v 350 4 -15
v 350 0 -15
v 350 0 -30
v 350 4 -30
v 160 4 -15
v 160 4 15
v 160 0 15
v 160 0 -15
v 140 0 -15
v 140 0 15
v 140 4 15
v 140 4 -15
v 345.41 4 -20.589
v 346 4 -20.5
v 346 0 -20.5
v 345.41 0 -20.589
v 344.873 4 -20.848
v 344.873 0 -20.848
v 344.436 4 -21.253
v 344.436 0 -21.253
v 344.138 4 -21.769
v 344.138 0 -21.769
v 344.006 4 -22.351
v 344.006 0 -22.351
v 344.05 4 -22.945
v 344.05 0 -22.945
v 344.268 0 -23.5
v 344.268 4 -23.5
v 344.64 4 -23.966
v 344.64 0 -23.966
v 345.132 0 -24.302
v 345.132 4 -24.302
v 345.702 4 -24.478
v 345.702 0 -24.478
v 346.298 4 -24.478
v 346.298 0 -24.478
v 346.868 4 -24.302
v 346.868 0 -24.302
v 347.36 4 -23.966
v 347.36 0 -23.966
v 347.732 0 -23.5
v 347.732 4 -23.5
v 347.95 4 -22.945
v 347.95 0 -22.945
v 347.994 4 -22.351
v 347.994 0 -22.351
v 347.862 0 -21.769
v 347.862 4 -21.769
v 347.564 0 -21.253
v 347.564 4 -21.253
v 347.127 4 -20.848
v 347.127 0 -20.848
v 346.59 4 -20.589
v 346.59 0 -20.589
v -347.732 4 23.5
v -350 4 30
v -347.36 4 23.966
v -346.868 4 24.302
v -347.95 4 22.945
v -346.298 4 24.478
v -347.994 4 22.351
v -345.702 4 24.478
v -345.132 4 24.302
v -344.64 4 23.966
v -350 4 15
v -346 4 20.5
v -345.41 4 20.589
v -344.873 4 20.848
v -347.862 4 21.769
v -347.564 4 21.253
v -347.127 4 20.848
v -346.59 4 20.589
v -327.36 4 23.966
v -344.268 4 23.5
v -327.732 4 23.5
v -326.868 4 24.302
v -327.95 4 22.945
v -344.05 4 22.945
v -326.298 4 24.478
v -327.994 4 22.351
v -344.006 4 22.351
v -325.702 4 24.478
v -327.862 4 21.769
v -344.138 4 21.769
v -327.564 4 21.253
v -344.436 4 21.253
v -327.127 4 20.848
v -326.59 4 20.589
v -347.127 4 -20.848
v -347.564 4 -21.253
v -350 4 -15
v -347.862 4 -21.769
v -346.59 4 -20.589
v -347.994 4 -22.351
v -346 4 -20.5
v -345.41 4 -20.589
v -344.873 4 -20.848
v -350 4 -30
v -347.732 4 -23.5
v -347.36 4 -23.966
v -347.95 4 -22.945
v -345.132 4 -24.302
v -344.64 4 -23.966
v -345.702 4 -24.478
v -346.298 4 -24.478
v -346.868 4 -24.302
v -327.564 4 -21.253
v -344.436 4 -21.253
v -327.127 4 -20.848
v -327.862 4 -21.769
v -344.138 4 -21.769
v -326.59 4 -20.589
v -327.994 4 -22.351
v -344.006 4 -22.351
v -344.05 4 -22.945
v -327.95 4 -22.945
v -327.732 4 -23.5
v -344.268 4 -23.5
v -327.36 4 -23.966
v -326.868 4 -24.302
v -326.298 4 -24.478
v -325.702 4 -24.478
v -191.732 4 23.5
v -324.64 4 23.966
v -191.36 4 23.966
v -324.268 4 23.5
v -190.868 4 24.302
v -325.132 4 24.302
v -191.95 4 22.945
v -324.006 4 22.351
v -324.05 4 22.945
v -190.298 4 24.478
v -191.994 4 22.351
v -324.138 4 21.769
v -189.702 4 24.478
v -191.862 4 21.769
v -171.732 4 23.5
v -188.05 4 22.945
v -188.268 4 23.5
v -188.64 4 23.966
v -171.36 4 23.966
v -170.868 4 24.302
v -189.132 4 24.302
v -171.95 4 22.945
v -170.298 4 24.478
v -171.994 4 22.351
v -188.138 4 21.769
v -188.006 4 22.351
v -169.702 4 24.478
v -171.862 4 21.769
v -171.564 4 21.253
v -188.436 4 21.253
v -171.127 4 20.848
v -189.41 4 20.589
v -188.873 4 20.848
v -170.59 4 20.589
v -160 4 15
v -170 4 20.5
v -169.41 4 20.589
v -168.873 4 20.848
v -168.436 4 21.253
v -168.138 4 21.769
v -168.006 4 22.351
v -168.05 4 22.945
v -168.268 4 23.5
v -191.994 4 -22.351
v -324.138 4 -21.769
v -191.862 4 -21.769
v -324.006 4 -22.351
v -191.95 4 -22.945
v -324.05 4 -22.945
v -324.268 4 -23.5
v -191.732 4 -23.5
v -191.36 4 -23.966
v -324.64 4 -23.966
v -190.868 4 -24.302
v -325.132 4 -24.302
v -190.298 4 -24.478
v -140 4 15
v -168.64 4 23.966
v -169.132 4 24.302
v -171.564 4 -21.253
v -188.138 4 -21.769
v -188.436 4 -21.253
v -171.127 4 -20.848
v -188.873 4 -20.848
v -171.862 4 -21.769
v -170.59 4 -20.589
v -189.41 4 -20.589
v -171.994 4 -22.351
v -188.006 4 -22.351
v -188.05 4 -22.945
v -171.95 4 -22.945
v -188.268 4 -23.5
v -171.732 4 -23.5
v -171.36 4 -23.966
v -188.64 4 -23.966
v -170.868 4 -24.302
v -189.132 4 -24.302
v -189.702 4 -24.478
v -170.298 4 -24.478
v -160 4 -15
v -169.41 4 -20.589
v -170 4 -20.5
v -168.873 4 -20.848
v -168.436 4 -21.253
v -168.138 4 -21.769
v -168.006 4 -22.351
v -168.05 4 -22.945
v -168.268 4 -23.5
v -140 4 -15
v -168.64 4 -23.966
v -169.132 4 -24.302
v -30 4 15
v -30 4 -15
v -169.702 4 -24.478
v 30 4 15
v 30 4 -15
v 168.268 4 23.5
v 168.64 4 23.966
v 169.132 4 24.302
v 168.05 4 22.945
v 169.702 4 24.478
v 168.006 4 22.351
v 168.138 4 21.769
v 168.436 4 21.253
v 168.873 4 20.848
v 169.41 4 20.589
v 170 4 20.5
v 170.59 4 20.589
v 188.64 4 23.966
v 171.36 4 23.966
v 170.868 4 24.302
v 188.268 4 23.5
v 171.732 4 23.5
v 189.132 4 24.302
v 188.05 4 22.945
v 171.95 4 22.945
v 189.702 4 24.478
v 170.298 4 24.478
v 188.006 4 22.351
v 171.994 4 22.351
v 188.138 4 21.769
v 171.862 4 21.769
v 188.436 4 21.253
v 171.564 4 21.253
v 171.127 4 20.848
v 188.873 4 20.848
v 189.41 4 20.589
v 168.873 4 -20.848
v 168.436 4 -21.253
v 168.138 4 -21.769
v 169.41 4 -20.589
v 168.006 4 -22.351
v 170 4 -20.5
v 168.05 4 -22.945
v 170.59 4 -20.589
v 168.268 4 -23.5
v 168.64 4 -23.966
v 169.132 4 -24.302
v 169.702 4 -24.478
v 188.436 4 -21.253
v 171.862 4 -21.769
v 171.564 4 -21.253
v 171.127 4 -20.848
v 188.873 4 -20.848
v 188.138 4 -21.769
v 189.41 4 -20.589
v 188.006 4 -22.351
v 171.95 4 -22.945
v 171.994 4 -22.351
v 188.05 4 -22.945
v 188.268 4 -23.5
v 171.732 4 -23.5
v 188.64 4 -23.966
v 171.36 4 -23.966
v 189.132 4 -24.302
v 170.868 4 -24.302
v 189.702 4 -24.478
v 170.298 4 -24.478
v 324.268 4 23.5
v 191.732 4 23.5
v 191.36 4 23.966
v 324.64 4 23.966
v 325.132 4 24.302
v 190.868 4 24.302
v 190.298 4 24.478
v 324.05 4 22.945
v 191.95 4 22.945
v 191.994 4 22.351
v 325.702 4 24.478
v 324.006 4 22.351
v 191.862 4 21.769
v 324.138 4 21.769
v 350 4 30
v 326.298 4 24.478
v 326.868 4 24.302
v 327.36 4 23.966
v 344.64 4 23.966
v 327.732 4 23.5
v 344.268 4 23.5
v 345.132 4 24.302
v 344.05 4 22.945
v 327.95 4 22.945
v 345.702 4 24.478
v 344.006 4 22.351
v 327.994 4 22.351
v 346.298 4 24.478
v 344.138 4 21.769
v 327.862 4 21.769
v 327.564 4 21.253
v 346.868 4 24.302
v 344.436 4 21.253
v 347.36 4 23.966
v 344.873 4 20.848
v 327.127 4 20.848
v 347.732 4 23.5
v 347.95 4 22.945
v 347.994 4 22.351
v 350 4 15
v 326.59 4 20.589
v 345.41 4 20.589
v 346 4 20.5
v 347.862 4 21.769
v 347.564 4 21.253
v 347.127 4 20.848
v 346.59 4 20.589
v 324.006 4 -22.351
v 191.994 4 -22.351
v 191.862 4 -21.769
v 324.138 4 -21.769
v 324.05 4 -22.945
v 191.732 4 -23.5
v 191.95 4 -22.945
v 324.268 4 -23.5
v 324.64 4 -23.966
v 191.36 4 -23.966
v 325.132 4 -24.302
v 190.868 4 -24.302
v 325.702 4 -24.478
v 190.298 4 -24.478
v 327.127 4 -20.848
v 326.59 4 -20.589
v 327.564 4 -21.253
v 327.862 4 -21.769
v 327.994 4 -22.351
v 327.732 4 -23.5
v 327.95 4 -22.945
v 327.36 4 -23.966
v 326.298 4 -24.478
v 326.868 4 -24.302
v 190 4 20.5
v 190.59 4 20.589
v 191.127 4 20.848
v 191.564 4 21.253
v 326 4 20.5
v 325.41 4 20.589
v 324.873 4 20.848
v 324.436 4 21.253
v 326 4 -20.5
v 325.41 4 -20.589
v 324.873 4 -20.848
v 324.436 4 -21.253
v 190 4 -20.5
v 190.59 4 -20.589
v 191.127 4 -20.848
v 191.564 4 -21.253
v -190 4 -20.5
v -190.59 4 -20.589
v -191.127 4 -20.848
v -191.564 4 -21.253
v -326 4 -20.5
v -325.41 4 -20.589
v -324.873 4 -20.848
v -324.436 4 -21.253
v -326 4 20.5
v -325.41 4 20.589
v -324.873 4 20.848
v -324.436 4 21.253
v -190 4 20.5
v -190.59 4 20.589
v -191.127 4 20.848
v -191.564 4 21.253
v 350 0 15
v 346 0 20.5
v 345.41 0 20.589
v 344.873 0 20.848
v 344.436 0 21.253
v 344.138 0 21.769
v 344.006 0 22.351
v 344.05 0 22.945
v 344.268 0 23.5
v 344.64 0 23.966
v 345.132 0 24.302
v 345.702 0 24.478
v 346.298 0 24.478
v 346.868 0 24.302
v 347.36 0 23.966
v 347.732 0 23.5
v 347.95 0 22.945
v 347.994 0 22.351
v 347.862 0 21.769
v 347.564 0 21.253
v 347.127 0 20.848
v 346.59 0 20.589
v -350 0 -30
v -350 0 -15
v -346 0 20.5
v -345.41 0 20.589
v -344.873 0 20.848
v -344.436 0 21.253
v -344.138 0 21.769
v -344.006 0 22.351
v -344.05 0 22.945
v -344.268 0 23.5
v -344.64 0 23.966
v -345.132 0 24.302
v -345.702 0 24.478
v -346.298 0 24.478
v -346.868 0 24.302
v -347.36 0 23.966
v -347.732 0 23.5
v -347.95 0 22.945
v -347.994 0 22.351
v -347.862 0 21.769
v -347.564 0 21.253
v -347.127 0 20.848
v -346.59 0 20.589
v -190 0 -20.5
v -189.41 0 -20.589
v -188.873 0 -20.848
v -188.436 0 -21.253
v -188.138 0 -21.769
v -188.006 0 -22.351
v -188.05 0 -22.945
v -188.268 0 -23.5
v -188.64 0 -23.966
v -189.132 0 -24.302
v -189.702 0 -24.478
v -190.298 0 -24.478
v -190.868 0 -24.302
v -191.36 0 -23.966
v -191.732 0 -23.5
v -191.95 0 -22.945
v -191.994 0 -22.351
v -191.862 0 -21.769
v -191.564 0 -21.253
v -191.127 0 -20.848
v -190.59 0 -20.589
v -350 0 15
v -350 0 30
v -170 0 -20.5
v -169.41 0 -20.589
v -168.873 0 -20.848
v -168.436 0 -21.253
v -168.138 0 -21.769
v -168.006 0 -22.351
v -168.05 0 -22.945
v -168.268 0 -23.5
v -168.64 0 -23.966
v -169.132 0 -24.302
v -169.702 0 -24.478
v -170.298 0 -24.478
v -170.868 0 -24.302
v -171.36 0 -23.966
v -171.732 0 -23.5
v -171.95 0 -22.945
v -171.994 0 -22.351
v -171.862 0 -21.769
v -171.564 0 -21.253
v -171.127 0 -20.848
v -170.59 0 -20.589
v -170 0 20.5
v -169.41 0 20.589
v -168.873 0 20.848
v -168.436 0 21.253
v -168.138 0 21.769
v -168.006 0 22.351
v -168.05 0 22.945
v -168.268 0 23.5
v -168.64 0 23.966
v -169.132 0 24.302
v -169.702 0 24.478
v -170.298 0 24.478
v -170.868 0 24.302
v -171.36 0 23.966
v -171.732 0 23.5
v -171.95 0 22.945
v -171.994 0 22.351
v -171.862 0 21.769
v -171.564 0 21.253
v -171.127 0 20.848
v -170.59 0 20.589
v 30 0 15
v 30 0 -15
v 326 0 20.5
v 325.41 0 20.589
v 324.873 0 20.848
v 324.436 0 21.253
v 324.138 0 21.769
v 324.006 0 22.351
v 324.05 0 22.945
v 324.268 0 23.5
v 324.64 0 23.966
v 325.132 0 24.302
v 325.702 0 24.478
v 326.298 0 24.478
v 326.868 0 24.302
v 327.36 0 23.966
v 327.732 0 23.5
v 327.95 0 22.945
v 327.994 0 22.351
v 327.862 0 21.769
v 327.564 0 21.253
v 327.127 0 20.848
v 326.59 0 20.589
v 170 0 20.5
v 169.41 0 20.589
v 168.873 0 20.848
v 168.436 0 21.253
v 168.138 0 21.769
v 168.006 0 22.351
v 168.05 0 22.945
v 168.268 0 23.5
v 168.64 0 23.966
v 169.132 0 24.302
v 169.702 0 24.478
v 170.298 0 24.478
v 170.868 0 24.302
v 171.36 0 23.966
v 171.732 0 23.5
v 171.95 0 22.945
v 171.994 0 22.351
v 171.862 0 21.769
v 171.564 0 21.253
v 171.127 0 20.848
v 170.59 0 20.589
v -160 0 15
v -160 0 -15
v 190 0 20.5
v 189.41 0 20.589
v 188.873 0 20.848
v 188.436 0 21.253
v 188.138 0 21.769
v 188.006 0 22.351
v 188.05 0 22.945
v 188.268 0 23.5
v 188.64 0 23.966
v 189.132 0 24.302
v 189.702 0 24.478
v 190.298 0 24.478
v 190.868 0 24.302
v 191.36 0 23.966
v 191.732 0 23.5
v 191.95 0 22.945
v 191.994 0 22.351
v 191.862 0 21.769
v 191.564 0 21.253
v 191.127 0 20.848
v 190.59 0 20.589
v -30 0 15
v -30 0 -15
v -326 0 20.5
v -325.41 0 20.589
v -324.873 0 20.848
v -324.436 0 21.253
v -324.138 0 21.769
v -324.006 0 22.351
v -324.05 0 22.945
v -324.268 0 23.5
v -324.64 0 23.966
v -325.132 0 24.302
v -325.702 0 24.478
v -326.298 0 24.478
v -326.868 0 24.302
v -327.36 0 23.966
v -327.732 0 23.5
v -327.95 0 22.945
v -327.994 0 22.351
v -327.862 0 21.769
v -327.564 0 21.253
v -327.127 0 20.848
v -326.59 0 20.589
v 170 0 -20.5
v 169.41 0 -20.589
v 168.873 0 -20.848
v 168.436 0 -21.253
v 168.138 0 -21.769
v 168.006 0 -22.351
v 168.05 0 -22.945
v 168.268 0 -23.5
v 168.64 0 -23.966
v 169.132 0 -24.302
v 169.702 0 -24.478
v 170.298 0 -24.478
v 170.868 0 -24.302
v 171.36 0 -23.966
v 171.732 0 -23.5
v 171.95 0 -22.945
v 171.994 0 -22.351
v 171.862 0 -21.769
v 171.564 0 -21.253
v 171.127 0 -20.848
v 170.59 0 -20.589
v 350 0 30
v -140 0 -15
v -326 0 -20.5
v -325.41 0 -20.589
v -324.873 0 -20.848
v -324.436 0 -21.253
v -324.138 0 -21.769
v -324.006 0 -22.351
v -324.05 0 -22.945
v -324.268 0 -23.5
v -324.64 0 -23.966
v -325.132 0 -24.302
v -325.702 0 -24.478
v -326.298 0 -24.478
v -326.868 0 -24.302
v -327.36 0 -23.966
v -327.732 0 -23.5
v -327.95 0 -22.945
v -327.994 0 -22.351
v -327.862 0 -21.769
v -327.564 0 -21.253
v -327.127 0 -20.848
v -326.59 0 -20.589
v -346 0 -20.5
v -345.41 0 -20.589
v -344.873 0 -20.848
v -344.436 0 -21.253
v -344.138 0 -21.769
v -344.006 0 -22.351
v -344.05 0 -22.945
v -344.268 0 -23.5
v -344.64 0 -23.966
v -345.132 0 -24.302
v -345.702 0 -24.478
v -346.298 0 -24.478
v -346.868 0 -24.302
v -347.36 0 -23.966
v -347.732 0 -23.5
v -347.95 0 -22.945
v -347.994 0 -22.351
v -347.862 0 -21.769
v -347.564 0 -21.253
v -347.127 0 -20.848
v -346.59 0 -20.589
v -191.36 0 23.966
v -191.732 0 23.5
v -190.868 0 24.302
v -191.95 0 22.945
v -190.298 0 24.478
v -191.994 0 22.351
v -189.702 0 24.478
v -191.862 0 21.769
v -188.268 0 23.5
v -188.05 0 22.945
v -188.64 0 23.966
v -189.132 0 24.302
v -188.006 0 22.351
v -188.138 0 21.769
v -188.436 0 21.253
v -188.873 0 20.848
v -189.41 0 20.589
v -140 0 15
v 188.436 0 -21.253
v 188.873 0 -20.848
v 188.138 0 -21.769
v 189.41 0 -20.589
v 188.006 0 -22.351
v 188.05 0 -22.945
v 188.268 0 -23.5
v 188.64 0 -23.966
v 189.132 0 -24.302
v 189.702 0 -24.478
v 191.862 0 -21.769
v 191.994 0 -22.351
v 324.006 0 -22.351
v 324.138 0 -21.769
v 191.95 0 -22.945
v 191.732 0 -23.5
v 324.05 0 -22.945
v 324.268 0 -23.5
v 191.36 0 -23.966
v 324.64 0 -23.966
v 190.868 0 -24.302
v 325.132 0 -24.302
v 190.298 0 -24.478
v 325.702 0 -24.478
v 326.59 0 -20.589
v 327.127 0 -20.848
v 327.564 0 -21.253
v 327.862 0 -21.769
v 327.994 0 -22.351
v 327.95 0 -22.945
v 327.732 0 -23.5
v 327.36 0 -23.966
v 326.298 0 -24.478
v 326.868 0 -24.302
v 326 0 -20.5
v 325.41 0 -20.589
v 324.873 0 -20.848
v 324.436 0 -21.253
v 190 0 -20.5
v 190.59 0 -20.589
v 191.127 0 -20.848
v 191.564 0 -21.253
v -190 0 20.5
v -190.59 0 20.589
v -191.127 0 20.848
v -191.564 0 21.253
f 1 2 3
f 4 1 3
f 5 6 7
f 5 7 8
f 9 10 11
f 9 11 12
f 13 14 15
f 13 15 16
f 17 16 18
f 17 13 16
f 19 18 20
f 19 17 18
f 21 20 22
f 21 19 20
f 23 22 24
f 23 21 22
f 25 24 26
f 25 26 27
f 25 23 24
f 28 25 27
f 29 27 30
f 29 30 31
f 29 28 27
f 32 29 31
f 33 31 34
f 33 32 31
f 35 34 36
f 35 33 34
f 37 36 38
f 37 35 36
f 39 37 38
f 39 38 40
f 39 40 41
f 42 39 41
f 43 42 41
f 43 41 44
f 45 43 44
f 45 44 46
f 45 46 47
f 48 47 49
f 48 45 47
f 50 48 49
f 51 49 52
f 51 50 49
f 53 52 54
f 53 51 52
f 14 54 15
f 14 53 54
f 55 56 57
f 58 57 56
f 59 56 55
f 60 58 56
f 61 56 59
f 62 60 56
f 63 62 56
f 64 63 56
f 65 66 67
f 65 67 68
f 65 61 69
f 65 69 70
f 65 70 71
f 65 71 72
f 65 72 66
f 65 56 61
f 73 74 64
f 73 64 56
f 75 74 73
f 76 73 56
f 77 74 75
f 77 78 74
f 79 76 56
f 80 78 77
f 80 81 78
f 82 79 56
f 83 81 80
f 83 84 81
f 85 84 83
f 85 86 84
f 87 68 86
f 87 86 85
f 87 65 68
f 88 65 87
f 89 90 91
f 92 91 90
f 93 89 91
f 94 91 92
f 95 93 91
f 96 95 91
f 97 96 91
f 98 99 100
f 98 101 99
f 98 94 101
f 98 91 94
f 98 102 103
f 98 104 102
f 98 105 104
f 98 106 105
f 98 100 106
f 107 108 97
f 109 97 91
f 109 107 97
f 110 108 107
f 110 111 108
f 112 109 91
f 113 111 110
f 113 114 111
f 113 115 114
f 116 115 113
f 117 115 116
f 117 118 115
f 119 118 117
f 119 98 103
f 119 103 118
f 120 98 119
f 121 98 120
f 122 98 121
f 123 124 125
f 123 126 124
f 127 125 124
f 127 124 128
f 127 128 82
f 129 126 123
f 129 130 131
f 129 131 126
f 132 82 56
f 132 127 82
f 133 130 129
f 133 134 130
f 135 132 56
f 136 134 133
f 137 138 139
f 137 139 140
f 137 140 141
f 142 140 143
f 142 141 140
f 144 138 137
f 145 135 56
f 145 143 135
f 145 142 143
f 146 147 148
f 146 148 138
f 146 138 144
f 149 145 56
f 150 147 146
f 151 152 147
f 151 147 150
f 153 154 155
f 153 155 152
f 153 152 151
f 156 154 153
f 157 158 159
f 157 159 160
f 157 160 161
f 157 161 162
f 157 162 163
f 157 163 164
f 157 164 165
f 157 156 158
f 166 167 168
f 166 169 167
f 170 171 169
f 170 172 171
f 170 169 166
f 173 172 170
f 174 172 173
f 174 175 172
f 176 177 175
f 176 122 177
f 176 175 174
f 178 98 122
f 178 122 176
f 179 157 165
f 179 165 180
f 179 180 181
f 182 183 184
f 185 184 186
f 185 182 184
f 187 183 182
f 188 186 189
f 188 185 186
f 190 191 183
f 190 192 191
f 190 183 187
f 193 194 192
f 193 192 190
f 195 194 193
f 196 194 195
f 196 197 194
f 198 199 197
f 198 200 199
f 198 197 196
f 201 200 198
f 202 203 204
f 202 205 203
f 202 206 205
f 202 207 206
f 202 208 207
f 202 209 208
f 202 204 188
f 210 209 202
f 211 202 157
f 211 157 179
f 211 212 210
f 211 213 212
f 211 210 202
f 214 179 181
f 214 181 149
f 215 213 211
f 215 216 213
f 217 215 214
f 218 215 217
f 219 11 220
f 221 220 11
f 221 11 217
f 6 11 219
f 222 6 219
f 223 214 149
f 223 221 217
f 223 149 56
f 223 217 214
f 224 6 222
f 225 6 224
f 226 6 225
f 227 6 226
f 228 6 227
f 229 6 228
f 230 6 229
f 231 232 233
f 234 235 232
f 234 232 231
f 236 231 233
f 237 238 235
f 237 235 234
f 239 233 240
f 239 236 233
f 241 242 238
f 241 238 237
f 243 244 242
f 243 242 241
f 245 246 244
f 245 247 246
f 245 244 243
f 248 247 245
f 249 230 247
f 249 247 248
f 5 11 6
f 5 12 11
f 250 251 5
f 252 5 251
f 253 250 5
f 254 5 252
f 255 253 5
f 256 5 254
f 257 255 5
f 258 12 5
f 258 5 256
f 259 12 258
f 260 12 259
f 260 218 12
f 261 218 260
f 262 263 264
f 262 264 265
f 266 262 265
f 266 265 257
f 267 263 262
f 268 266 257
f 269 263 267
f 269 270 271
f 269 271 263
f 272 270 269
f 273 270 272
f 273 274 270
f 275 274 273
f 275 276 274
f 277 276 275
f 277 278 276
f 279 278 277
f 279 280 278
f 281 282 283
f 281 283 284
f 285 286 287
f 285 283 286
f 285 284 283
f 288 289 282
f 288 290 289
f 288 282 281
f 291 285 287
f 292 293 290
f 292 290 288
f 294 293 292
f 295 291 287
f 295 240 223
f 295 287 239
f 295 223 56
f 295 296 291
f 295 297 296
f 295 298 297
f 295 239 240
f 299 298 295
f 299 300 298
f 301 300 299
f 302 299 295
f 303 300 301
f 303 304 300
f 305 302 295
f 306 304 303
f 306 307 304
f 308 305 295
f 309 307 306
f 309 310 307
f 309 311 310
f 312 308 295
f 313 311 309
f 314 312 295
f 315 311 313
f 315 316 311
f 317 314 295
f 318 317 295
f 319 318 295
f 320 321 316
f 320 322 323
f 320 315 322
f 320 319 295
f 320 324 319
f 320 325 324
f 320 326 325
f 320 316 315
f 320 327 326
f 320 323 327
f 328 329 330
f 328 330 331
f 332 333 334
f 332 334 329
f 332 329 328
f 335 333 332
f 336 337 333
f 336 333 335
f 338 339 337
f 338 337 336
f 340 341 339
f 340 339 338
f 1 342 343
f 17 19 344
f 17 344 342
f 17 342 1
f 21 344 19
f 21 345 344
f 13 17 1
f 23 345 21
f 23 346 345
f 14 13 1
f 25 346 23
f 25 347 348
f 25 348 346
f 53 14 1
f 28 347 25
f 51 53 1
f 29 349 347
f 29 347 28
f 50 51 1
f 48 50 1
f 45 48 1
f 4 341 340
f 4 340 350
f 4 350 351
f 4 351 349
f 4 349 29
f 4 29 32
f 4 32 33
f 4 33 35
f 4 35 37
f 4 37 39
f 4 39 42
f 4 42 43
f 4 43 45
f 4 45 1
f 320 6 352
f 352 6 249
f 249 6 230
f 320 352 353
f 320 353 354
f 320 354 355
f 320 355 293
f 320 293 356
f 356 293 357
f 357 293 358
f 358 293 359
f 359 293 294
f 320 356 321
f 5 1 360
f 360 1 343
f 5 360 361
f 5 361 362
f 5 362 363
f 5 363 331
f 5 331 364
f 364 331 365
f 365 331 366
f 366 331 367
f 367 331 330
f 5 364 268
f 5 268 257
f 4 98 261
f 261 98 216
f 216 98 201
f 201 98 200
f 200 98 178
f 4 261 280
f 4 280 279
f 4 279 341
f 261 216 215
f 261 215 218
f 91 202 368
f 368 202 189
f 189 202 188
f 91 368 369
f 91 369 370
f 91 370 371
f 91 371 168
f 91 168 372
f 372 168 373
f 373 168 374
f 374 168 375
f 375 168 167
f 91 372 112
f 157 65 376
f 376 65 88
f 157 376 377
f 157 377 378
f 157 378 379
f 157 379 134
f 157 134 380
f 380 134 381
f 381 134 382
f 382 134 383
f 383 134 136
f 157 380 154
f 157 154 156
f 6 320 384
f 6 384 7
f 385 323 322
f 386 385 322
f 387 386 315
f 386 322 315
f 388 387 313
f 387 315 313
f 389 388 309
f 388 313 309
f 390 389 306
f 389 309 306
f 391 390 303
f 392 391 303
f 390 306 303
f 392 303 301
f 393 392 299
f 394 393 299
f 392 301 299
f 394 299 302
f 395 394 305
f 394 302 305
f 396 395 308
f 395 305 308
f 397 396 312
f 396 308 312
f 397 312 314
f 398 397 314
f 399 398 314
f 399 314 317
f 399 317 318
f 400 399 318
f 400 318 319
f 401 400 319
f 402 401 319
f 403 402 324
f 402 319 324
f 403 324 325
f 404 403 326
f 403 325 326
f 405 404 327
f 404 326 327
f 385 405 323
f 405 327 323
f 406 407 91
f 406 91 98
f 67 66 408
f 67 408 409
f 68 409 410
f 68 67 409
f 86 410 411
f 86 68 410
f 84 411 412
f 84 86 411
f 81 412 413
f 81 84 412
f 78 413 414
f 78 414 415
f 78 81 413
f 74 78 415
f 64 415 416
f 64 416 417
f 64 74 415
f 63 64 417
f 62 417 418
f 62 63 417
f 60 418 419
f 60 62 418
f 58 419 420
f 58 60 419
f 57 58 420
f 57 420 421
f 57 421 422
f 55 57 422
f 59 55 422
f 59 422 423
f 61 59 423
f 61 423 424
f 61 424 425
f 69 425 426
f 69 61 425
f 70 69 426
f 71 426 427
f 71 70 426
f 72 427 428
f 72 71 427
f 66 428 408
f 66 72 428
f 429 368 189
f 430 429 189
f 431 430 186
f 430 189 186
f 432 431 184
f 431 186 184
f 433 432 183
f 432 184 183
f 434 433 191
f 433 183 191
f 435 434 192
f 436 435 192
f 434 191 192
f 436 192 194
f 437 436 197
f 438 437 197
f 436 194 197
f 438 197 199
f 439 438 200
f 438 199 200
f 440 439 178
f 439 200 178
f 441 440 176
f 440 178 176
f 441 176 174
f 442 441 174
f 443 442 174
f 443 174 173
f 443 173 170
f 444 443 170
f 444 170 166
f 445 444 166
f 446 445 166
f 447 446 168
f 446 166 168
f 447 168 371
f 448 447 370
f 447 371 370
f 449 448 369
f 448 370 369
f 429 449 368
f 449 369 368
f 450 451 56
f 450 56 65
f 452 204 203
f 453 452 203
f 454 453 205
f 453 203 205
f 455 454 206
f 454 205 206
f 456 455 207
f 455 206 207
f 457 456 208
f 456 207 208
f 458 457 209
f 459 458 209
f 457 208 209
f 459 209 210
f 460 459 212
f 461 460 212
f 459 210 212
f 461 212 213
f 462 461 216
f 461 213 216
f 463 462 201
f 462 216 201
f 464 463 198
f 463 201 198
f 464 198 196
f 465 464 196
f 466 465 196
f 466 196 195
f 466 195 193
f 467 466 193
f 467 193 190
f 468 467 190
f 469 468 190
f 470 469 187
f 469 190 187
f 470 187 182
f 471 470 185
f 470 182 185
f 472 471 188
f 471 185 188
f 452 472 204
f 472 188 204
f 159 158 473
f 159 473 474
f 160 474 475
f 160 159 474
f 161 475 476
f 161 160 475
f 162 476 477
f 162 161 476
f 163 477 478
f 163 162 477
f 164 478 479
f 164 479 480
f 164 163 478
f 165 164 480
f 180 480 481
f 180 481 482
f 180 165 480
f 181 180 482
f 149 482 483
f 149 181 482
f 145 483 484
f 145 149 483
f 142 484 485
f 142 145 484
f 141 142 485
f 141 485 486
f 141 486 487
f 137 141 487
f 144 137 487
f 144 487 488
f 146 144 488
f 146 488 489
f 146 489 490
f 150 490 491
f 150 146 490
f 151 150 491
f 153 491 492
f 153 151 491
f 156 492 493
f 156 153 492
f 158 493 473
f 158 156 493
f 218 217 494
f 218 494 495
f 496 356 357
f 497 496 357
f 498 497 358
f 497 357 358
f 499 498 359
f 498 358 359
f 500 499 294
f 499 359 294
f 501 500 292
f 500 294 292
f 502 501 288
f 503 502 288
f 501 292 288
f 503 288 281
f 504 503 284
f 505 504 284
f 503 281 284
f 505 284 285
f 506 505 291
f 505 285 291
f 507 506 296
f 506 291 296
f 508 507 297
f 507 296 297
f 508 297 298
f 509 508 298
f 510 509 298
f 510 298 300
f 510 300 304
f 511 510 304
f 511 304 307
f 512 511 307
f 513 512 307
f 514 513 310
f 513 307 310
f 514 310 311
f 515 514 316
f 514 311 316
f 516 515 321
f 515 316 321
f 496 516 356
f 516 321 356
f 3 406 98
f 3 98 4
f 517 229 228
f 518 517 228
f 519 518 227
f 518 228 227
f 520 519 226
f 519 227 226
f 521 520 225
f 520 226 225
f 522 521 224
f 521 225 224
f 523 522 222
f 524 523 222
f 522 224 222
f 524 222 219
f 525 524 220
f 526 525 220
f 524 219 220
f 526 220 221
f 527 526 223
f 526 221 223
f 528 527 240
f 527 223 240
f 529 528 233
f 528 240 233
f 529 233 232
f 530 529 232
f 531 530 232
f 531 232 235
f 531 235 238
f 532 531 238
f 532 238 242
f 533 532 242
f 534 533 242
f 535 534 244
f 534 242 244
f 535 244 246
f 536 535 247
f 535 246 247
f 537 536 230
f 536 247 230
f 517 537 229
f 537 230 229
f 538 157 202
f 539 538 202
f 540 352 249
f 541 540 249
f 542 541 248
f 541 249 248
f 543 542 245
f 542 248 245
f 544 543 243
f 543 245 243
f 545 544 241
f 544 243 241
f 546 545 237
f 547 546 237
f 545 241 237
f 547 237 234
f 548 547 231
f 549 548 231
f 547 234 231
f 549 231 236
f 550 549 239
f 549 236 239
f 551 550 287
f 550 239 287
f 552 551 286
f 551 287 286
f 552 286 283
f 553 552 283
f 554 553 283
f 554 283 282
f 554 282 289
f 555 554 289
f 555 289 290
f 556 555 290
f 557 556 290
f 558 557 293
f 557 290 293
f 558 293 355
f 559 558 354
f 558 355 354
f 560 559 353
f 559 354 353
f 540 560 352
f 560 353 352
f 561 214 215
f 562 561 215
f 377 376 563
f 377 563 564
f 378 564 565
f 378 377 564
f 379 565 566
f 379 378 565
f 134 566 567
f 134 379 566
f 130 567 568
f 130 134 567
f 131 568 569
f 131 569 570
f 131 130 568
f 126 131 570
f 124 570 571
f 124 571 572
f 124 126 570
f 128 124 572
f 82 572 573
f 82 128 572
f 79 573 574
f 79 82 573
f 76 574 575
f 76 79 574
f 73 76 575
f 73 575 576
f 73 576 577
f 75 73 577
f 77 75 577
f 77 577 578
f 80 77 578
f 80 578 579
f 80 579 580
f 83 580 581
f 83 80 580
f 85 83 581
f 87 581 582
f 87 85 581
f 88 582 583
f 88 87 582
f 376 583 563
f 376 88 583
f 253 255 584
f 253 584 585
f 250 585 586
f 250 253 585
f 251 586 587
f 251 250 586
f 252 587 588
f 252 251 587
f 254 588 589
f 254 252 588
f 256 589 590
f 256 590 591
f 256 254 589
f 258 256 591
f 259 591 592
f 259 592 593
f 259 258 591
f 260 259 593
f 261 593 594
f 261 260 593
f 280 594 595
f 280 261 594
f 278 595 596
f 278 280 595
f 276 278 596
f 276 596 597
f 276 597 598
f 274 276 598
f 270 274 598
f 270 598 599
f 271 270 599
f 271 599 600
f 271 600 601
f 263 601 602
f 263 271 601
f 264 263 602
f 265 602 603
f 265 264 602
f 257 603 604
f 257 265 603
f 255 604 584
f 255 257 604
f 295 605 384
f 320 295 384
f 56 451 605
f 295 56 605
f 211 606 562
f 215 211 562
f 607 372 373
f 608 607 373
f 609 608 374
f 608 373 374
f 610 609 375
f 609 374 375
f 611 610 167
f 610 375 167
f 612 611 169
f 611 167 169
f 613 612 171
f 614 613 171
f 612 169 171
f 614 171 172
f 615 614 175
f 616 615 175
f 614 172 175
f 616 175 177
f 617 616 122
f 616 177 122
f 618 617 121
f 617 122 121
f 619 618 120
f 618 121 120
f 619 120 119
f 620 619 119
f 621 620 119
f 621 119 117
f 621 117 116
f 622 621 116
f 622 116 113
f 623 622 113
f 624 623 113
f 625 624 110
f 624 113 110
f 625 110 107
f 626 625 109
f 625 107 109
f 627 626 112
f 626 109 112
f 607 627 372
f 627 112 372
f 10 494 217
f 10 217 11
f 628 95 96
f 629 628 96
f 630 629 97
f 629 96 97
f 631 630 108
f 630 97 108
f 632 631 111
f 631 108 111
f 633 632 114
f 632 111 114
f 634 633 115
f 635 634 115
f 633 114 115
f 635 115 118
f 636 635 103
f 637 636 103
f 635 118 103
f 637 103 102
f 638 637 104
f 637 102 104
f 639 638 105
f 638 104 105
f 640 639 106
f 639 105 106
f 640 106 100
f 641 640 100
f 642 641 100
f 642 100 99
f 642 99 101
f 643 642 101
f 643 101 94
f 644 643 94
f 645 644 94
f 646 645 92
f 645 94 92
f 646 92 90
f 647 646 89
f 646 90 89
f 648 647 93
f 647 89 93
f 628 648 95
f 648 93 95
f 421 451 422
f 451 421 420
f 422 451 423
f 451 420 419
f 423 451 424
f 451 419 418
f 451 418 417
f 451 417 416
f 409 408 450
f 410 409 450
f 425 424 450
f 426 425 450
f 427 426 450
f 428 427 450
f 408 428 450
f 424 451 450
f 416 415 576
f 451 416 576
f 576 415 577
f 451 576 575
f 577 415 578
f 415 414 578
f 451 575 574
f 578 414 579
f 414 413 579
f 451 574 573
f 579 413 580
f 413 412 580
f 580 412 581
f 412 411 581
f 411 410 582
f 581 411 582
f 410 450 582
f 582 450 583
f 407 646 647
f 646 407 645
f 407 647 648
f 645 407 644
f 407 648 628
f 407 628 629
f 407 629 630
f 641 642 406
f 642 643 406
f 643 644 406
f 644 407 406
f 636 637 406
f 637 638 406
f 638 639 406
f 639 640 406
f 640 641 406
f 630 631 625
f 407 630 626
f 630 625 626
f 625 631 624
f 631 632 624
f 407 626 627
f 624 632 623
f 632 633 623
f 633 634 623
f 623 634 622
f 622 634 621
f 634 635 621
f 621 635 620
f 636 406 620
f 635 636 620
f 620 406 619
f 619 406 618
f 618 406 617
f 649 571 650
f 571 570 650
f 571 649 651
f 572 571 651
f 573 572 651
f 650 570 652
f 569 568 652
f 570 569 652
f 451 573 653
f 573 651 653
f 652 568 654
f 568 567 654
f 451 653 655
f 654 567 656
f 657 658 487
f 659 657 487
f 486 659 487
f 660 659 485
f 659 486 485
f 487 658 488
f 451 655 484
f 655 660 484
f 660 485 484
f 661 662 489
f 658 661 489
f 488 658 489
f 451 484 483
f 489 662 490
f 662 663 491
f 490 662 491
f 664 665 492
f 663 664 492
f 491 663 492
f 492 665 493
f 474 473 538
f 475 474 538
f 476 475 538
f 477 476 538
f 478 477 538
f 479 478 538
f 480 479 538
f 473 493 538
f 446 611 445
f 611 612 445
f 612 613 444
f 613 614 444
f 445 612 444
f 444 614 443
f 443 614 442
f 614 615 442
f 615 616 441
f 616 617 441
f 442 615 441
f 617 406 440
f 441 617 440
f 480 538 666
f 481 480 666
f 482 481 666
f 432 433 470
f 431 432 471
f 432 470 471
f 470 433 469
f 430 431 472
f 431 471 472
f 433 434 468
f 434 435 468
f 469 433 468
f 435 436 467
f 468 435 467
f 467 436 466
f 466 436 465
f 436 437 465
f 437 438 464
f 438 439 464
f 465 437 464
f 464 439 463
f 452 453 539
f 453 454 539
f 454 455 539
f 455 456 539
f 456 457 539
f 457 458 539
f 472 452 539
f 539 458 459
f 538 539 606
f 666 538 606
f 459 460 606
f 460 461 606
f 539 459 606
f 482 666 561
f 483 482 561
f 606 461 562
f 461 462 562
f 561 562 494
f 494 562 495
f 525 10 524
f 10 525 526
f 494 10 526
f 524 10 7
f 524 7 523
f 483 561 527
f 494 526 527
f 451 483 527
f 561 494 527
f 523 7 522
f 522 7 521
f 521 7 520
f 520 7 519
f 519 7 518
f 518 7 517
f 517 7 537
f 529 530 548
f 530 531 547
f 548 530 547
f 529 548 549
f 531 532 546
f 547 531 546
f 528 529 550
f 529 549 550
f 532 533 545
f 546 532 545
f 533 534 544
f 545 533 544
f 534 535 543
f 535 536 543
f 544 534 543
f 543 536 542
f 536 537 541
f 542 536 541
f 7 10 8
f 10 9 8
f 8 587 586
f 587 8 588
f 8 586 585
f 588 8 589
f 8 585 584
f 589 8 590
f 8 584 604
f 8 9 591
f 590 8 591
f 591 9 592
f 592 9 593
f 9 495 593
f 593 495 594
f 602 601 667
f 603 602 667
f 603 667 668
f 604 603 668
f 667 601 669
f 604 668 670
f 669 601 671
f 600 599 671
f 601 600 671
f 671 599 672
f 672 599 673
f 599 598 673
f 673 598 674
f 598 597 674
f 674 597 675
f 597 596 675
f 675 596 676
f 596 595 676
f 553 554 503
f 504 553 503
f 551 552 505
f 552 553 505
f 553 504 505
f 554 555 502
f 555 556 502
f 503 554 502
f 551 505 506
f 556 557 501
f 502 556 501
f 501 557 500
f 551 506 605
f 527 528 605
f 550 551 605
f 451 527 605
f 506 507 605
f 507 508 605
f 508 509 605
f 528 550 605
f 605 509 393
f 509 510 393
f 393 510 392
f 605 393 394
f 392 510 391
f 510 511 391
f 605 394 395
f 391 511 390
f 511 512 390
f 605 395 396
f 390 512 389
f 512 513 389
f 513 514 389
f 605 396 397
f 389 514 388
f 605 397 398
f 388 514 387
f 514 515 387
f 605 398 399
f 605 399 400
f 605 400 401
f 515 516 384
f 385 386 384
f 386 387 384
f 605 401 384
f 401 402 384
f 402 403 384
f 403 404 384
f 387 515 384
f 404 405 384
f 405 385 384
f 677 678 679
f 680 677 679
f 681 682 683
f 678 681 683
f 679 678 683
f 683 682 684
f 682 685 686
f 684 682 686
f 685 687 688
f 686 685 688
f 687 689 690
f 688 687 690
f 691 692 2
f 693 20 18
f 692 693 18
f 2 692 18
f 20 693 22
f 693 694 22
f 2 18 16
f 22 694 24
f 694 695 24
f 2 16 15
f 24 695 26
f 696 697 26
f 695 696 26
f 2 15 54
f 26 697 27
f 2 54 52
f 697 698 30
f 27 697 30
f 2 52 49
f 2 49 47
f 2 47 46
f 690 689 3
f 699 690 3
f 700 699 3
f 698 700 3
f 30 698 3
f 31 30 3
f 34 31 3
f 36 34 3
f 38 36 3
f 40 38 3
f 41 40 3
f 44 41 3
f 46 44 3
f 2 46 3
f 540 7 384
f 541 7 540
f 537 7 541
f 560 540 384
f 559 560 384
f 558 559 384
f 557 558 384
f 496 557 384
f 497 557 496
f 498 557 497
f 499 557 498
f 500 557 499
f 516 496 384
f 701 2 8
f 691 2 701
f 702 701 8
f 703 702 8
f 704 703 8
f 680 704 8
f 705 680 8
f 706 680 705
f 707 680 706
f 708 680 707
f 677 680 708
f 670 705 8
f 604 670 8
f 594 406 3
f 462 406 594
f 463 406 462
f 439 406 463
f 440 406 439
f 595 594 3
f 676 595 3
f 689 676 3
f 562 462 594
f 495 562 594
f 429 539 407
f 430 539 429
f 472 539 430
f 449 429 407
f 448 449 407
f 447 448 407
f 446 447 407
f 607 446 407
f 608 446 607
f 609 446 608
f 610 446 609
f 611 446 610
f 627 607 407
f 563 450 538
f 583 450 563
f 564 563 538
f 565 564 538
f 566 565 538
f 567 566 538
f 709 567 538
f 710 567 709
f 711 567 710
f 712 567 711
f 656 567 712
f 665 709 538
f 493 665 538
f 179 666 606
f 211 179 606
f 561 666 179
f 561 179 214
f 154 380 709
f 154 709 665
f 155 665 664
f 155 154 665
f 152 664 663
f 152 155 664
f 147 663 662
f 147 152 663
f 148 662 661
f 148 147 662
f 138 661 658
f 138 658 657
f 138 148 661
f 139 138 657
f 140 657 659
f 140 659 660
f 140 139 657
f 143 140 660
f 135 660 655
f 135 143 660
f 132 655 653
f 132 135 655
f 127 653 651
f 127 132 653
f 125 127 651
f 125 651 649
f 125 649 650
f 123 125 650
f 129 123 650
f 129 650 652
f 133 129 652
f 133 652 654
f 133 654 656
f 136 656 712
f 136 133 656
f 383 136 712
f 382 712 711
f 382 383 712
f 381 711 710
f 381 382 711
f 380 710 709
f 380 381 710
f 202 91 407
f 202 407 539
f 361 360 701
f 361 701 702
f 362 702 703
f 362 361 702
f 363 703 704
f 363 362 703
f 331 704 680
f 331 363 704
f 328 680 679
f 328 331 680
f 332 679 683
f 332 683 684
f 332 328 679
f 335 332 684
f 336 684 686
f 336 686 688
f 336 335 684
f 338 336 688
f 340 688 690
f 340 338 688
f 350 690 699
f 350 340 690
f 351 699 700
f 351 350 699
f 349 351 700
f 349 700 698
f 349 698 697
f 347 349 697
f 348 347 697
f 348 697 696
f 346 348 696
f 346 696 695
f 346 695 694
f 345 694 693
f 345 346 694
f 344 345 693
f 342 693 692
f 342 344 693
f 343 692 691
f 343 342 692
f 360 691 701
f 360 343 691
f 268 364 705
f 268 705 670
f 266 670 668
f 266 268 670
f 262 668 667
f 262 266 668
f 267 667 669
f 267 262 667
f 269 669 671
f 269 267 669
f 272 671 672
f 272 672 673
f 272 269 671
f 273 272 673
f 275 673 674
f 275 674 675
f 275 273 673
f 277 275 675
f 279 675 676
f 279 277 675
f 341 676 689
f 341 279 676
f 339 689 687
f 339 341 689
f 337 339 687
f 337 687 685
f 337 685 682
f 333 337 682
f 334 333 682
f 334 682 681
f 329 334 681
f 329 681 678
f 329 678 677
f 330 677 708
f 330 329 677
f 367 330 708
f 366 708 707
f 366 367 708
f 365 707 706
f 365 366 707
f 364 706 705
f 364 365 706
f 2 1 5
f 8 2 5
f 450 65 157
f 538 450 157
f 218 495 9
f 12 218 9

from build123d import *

# Parameters (mm, degrees)
SKETCH_1_W                                 = 700
SKETCH_1_H                                 = 60
SKETCH_1_W_2                               = 280
SKETCH_1_H_2                               = 30
EXTRUDE_1_DEPTH                            = 4
SKETCH_2_W                                 = 190
SKETCH_2_H                                 = 30
CUT_EXTRUDE_1_DEPTH                        = 4
SKETCH_3_R                                 = 2
CUT_EXTRUDE_2_DEPTH                        = 4
MIRROR_2_AT_THE_SECOND_PLANE_COPY_1_SKET_R = 2
MIRROR_2_AT_THE_SECOND_PLANE_COPY_1_DEPTH  = 4
SKETCH_4_W                                 = 60
SKETCH_4_H                                 = 30
EXTRUDE_2_DEPTH                            = 4


with BuildPart() as part:
    # 草图1 → 凸台-拉伸1 (new body)
    with BuildSketch(Plane(origin=(0, 0, 0), x_dir=(1, 0, 0), z_dir=(0, 1, 0))):
        Rectangle(SKETCH_1_W, SKETCH_1_H)
        Rectangle(SKETCH_1_W_2, SKETCH_1_H_2, mode=Mode.SUBTRACT)
    extrude(amount=EXTRUDE_1_DEPTH)

    # 草图2 → 切除-拉伸1 (cut)
    with BuildSketch(Plane(origin=(0, 4, 0), x_dir=(1, 0, 0), z_dir=(0, 1, 0))):
        with Locations((-255, 0)):
            Rectangle(SKETCH_2_W, SKETCH_2_H)
    cut_extrude_1 = extrude(amount=-CUT_EXTRUDE_1_DEPTH, mode=Mode.SUBTRACT)

    # 镜向1: 切除-拉伸1 across plane
    add(cut_extrude_1.mirror(Plane(origin=(0, 0, 0), x_dir=(0, 0, 1), z_dir=(1, 0, 0))), mode=Mode.SUBTRACT)

    # 草图3 → 切除-拉伸2 (cut)
    with BuildSketch(Plane(origin=(0, 4, 0), x_dir=(1, 0, 0), z_dir=(0, 1, 0))):
        with Locations(Location((-190, 22.5, 0), (0, 0, 270))):
            Circle(SKETCH_3_R)
        with Locations(Location((-170, 22.5, 0), (0, 0, 270))):
            Circle(SKETCH_3_R)
        with Locations(Location((-346, 22.5, 0), (0, 0, 270))):
            Circle(SKETCH_3_R)
        with Locations(Location((-326, 22.5, 0), (0, 0, 270))):
            Circle(SKETCH_3_R)
    cut_extrude_2 = extrude(amount=-CUT_EXTRUDE_2_DEPTH, mode=Mode.SUBTRACT)

    # 镜向2: 切除-拉伸2 across plane
    add(cut_extrude_2.mirror(Plane(origin=(0, 0, 0), x_dir=(0, 0, 1), z_dir=(1, 0, 0))), mode=Mode.SUBTRACT)

    # 镜向2 at the second plane: 切除-拉伸2 across plane
    add(cut_extrude_2.mirror(Plane.XY), mode=Mode.SUBTRACT)

    # 镜向2 at the second plane copy 1 sket → 镜向2 at the second plane copy 1 (cut)
    with BuildSketch(Plane(origin=(0, 4, 0), x_dir=(-1, 0, 0), z_dir=(0, 1, 0))):
        with Locations(Location((-190, 22.5, 0), (0, 0, 270))):
            Circle(MIRROR_2_AT_THE_SECOND_PLANE_COPY_1_SKET_R)
        with Locations(Location((-170, 22.5, 0), (0, 0, 270))):
            Circle(MIRROR_2_AT_THE_SECOND_PLANE_COPY_1_SKET_R)
        with Locations(Location((-346, 22.5, 0), (0, 0, 270))):
            Circle(MIRROR_2_AT_THE_SECOND_PLANE_COPY_1_SKET_R)
        with Locations(Location((-326, 22.5, 0), (0, 0, 270))):
            Circle(MIRROR_2_AT_THE_SECOND_PLANE_COPY_1_SKET_R)
    extrude(amount=-MIRROR_2_AT_THE_SECOND_PLANE_COPY_1_DEPTH, mode=Mode.SUBTRACT)

    # 草图4 → 凸台-拉伸2 (add)
    with BuildSketch(Plane(origin=(0, 4, 0), x_dir=(1, 0, 0), z_dir=(0, 1, 0))):
        Rectangle(SKETCH_4_W, SKETCH_4_H)
    extrude(amount=-EXTRUDE_2_DEPTH)


solid = part.part
